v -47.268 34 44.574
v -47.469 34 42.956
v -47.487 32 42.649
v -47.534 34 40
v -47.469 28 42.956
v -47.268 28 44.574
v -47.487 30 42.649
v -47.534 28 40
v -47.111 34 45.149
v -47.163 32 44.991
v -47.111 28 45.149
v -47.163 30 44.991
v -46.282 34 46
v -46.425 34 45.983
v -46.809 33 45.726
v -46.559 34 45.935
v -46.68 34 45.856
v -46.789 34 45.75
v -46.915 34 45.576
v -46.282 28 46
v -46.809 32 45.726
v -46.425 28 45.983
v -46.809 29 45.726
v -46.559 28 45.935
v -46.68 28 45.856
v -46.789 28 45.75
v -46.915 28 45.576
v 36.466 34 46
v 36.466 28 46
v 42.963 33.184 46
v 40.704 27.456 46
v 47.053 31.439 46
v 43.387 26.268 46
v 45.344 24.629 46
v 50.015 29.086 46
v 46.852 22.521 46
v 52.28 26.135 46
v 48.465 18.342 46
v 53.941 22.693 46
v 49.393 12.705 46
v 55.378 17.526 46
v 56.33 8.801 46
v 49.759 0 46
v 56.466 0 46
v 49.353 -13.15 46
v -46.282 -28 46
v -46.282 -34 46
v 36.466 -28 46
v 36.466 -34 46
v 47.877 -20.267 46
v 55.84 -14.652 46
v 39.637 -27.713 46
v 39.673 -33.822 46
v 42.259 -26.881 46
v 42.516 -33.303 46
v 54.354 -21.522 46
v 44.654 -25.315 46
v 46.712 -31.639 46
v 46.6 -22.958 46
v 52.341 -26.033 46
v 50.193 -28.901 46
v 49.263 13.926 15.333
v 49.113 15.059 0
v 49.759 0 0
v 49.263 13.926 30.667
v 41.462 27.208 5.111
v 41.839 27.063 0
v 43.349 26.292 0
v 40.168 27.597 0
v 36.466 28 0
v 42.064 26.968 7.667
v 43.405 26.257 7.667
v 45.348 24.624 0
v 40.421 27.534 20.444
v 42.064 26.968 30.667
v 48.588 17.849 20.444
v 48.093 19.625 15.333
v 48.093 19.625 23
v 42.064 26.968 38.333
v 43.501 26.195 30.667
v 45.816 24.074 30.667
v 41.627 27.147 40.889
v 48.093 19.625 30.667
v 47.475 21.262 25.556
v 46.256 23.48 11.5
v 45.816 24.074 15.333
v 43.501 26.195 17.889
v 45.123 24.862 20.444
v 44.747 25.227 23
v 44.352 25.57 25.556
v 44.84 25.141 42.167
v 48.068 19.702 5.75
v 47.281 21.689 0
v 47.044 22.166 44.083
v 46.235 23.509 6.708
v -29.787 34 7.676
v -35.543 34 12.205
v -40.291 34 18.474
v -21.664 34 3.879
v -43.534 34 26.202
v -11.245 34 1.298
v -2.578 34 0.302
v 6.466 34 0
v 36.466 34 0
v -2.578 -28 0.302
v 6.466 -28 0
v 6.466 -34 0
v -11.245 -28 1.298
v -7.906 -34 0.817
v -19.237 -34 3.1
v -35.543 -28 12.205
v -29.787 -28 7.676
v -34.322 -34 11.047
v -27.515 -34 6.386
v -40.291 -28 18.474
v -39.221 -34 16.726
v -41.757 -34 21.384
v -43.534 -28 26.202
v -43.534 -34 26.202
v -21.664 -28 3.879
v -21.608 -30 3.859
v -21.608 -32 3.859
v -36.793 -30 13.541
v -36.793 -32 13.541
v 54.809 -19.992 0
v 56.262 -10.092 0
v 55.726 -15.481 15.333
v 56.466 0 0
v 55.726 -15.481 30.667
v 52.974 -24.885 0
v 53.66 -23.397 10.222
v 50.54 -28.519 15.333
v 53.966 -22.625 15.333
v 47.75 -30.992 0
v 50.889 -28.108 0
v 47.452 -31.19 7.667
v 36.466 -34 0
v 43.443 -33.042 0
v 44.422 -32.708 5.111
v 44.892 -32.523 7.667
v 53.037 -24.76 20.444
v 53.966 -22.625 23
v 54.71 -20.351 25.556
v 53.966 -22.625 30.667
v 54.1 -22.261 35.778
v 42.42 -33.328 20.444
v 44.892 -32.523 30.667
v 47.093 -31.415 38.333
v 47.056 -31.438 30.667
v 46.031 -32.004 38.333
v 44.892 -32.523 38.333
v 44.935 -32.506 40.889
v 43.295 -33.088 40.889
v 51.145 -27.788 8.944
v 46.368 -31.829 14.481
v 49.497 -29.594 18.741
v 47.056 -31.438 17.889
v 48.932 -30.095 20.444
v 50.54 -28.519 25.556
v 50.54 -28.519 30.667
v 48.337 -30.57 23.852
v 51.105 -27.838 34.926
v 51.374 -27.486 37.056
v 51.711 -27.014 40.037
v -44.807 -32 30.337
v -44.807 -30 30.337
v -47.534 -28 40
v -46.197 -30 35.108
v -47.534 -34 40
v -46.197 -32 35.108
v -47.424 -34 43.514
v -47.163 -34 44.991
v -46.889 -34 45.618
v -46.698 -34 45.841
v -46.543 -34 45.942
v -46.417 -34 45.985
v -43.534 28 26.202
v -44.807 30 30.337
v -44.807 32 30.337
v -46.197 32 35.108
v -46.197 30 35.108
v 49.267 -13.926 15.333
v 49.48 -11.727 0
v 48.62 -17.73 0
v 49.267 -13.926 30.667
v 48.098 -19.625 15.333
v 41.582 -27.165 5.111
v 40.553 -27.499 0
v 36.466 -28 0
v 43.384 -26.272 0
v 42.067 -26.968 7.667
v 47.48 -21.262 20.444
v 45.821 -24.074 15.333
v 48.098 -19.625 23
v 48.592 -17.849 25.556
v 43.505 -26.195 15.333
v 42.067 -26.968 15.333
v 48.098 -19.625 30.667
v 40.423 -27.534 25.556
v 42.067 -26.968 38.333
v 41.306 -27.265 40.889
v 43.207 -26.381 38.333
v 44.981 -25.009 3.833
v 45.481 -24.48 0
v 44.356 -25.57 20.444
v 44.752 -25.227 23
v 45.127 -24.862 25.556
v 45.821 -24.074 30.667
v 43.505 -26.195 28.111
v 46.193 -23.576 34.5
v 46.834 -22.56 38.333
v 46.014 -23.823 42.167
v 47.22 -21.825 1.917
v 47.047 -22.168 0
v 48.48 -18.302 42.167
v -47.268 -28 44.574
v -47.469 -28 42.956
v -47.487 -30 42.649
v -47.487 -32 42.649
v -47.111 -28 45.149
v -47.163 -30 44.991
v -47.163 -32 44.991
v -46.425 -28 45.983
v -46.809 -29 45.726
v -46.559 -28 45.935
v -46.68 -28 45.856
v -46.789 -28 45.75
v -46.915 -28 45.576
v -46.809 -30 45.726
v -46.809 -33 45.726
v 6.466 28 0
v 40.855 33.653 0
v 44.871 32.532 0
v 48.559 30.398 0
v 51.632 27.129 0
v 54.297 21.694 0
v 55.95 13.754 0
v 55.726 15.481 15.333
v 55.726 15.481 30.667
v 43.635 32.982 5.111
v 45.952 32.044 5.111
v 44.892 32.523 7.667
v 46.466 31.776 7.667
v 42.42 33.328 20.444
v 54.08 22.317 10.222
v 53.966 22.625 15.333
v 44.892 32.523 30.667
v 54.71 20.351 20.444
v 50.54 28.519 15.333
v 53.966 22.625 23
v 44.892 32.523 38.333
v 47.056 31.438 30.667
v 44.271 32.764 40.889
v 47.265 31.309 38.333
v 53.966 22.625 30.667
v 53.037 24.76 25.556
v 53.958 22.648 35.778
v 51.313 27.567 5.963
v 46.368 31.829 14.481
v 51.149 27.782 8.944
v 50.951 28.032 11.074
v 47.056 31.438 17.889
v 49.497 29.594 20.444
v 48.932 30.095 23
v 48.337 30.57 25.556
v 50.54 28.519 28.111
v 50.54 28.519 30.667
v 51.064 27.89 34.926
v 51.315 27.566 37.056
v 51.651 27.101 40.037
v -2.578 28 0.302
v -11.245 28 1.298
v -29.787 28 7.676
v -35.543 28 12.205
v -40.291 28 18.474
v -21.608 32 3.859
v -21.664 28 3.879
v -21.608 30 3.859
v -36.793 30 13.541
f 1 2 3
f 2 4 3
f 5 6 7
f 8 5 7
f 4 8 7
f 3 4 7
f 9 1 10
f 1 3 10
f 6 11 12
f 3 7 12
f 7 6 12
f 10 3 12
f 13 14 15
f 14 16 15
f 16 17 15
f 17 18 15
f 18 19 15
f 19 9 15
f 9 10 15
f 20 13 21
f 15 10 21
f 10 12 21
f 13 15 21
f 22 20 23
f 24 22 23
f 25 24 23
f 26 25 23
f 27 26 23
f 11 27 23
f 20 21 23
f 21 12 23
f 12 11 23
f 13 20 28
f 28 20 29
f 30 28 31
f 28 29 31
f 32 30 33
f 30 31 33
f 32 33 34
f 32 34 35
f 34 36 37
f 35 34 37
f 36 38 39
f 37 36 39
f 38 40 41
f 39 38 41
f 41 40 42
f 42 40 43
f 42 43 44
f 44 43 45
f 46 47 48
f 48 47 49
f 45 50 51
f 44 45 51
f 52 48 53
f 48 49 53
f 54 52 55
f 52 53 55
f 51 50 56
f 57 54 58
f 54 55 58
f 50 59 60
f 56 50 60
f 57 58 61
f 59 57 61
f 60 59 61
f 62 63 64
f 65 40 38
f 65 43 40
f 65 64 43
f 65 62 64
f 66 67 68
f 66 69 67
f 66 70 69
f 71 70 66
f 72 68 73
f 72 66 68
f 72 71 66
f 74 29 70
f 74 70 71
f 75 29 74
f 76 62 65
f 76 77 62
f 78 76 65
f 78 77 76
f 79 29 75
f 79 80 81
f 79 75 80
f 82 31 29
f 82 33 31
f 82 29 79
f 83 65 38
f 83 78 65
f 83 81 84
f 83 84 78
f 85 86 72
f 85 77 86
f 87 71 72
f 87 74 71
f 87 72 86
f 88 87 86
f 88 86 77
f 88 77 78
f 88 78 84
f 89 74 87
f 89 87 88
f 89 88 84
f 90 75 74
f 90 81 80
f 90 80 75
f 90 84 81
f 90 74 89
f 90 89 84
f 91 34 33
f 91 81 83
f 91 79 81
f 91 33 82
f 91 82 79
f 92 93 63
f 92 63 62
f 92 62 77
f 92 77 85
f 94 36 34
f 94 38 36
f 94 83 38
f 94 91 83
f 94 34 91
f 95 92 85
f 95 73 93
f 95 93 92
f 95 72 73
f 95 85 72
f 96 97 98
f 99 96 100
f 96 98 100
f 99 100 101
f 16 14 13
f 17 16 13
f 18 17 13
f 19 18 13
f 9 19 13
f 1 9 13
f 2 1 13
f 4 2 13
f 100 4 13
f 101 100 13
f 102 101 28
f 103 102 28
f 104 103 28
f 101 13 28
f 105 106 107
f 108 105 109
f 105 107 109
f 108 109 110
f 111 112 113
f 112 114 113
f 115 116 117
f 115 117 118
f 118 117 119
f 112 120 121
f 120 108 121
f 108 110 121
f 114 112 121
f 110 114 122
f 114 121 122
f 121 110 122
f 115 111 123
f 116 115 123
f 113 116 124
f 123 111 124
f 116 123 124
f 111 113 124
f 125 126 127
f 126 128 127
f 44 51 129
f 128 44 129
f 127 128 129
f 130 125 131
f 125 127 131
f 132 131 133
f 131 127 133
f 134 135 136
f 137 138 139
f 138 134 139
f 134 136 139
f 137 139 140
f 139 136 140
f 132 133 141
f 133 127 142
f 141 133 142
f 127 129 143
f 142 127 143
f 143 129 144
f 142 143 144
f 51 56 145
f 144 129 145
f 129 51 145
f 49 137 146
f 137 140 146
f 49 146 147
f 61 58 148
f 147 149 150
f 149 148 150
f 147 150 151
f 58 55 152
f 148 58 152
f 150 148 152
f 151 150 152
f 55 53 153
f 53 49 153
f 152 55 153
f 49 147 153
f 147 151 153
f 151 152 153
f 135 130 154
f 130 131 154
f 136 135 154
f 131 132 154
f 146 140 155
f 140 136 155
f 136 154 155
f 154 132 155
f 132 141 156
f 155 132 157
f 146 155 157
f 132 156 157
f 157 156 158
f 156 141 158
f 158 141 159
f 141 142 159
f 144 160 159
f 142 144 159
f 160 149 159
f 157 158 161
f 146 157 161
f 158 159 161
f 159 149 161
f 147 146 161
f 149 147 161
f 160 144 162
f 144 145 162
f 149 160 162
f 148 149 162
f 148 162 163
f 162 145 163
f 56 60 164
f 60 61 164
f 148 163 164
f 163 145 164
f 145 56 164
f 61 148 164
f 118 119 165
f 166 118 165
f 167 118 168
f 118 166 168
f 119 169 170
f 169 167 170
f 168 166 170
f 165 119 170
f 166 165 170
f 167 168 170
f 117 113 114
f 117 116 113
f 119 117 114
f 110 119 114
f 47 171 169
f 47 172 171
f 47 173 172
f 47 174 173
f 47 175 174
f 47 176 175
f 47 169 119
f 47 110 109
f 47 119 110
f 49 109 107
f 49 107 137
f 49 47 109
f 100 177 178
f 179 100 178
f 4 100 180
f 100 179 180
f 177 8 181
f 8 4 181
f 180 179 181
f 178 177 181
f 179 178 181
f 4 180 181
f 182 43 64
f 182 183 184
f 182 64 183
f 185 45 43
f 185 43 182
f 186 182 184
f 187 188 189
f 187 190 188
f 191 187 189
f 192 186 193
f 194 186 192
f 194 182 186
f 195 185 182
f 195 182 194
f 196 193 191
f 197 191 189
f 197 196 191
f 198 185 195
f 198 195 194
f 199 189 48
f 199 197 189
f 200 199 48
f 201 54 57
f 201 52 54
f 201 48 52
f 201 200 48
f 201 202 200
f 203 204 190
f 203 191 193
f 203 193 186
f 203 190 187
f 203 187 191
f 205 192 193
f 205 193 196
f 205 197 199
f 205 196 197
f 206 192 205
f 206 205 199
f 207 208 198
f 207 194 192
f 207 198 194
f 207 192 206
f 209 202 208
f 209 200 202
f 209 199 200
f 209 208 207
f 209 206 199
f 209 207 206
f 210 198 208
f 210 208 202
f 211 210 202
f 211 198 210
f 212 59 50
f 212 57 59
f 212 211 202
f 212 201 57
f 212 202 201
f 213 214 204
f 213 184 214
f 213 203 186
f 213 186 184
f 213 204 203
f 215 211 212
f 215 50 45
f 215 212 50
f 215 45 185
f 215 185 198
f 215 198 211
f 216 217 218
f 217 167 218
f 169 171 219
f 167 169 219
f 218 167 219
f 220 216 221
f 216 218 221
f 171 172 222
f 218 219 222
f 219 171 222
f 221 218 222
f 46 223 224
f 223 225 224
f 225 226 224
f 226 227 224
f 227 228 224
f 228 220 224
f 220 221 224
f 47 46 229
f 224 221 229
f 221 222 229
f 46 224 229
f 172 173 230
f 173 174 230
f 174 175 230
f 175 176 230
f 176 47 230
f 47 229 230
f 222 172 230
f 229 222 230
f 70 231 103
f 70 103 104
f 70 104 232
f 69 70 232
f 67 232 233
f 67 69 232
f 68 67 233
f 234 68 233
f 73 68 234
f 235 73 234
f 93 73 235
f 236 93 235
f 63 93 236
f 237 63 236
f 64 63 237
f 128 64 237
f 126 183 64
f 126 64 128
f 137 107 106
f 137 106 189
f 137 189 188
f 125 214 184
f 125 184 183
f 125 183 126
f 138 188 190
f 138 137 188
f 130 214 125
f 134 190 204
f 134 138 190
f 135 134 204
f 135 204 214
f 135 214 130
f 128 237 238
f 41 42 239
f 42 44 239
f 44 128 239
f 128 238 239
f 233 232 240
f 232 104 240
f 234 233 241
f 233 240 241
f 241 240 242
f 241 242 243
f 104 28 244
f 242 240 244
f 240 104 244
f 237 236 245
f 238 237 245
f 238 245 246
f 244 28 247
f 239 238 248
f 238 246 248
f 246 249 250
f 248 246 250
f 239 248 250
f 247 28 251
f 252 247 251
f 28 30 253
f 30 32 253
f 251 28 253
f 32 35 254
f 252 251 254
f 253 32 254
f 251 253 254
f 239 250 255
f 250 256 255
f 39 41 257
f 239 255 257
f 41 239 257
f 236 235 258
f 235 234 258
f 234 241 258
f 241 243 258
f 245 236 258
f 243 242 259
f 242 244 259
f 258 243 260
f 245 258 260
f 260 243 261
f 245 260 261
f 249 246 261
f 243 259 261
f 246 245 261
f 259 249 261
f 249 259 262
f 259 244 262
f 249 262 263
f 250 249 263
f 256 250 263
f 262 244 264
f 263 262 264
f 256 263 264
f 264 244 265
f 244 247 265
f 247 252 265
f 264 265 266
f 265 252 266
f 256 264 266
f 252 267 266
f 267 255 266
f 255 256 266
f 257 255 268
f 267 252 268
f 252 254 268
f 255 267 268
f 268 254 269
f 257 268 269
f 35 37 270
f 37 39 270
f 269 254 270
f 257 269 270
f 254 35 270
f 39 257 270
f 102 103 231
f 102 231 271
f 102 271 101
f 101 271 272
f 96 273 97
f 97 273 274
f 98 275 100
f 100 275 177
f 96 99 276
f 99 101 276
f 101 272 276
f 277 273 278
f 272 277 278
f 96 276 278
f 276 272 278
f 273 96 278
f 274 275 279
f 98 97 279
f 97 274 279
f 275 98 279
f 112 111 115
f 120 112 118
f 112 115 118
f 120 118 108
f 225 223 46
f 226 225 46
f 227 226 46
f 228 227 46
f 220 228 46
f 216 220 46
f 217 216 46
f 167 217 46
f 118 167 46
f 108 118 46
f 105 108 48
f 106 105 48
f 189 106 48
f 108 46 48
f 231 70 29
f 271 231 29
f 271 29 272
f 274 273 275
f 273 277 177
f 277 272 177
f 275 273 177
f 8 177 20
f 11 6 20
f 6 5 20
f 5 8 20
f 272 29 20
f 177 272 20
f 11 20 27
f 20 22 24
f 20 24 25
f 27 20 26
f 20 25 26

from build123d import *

# Parameters (mm, degrees)
F0_W     = 104
F0_H     = 46
F1_DEPTH = 34
F3_DEPTH = 46.001
F5_DEPTH = 46.0010001
F7_DEPTH = 68.0010001


with BuildPart() as f1:
    # F0 (on Front) → F1 (new body, symmetric)
    with BuildSketch(Plane.XZ):
        with Locations((4.4662589207, 23)):
            Rectangle(F0_W, F0_H)
    extrude(amount=F1_DEPTH, both=True)

    # F2 (on face) → F3 (cut, through all)
    with BuildSketch(Plane.XY.offset(46)):
        with BuildLine():
            Line((56.4662589207, 34), (36.4662589207, 34))
            add(Edge.make_bspline(
                [(36.4662589207, 34), (56.4662589207, 34), (56.4662589207, 15), (56.4662589207, 0)],
                knots=[0, 0, 0, 0, 39.4461658466, 39.4461658466, 39.4461658466, 39.4461658466], degree=3))
            Line((56.4662589207, 0), (56.4662589207, 34))
        make_face()
        with BuildLine():
            Line((56.4662589207, -34), (56.4662589207, 0))
            add(Edge.make_bspline(
                [(56.4662589207, 0), (56.4662589207, -15), (56.4662589207, -34), (36.4662589207, -34)],
                knots=[0, 0, 0, 0, 39.4461658466, 39.4461658466, 39.4461658466, 39.4461658466], degree=3))
            Line((36.4662589207, -34), (56.4662589207, -34))
        make_face()
    extrude(amount=-F3_DEPTH, mode=Mode.SUBTRACT)

    # F4 (on face) → F5 (cut, through all)
    with BuildSketch(Plane.XY.offset(46)):
        with BuildLine():
            Line((36.4662589207, 28), (-47.5337410793, 28))
            Line((-47.5337410793, 28), (-47.5337410793, -28))
            Line((-47.5337410793, -28), (36.4662589207, -28))
            add(Edge.make_bspline(
                [(49.7592477622, 0), (49.7592477622, -15), (49.7592477622, -28), (36.4662589207, -28)],
                knots=[0, 0, 0, 0, 30.9952182173, 30.9952182173, 30.9952182173, 30.9952182173], degree=3))
            add(Edge.make_bspline(
                [(36.4662589207, 28), (49.7518497669, 28), (49.7537801128, 15), (49.7592477622, 0)],
                knots=[0, 0, 0, 0, 30.9952182173, 30.9952182173, 30.9952182173, 30.9952182173], degree=3))
        make_face()
    extrude(amount=-F5_DEPTH, mode=Mode.SUBTRACT)

    # F6 (on face) → F7 (cut, through all)
    with BuildSketch(Plane.XZ.offset(34)):
        with BuildLine():
            Line((-47.5337410793, 0), (6.4662589207, 0))
            add(Edge.make_bspline(
                [(6.4662589207, 0), (-29.5337410793, 0), (-39.5337410793, 13), (-43.5337410793, 26.2024675506)],
                knots=[0, 0, 0, 0, 56.4497059845, 56.4497059845, 56.4497059845, 56.4497059845], degree=3))
            add(Edge.make_bspline(
                [(-43.5337410793, 26.2024675506), (-44.6908287704, 29.8478620036), (-46.2817139924, 35.2189317346), (-47.5337410793, 40)],
                knots=[0, 0, 0, 0, 14.3656500616, 14.3656500616, 14.3656500616, 14.3656500616], degree=3))
            Line((-47.5337410793, 40), (-47.5337410793, 0))
        make_face()
        with BuildLine():
            Line((-47.5337410793, 46), (-47.5337410793, 40))
            add(Edge.make_bspline(
                [(-47.5337410793, 40), (-47.5337410793, 42.4598008394), (-47.5337410793, 46), (-46.2817139924, 46)],
                knots=[0, 0, 0, 0, 6.1292390903, 6.1292390903, 6.1292390903, 6.1292390903], degree=3))
            Line((-46.2817139924, 46), (-47.5337410793, 46))
        make_face()
    extrude(amount=-F7_DEPTH, mode=Mode.SUBTRACT)


solid = f1.part
